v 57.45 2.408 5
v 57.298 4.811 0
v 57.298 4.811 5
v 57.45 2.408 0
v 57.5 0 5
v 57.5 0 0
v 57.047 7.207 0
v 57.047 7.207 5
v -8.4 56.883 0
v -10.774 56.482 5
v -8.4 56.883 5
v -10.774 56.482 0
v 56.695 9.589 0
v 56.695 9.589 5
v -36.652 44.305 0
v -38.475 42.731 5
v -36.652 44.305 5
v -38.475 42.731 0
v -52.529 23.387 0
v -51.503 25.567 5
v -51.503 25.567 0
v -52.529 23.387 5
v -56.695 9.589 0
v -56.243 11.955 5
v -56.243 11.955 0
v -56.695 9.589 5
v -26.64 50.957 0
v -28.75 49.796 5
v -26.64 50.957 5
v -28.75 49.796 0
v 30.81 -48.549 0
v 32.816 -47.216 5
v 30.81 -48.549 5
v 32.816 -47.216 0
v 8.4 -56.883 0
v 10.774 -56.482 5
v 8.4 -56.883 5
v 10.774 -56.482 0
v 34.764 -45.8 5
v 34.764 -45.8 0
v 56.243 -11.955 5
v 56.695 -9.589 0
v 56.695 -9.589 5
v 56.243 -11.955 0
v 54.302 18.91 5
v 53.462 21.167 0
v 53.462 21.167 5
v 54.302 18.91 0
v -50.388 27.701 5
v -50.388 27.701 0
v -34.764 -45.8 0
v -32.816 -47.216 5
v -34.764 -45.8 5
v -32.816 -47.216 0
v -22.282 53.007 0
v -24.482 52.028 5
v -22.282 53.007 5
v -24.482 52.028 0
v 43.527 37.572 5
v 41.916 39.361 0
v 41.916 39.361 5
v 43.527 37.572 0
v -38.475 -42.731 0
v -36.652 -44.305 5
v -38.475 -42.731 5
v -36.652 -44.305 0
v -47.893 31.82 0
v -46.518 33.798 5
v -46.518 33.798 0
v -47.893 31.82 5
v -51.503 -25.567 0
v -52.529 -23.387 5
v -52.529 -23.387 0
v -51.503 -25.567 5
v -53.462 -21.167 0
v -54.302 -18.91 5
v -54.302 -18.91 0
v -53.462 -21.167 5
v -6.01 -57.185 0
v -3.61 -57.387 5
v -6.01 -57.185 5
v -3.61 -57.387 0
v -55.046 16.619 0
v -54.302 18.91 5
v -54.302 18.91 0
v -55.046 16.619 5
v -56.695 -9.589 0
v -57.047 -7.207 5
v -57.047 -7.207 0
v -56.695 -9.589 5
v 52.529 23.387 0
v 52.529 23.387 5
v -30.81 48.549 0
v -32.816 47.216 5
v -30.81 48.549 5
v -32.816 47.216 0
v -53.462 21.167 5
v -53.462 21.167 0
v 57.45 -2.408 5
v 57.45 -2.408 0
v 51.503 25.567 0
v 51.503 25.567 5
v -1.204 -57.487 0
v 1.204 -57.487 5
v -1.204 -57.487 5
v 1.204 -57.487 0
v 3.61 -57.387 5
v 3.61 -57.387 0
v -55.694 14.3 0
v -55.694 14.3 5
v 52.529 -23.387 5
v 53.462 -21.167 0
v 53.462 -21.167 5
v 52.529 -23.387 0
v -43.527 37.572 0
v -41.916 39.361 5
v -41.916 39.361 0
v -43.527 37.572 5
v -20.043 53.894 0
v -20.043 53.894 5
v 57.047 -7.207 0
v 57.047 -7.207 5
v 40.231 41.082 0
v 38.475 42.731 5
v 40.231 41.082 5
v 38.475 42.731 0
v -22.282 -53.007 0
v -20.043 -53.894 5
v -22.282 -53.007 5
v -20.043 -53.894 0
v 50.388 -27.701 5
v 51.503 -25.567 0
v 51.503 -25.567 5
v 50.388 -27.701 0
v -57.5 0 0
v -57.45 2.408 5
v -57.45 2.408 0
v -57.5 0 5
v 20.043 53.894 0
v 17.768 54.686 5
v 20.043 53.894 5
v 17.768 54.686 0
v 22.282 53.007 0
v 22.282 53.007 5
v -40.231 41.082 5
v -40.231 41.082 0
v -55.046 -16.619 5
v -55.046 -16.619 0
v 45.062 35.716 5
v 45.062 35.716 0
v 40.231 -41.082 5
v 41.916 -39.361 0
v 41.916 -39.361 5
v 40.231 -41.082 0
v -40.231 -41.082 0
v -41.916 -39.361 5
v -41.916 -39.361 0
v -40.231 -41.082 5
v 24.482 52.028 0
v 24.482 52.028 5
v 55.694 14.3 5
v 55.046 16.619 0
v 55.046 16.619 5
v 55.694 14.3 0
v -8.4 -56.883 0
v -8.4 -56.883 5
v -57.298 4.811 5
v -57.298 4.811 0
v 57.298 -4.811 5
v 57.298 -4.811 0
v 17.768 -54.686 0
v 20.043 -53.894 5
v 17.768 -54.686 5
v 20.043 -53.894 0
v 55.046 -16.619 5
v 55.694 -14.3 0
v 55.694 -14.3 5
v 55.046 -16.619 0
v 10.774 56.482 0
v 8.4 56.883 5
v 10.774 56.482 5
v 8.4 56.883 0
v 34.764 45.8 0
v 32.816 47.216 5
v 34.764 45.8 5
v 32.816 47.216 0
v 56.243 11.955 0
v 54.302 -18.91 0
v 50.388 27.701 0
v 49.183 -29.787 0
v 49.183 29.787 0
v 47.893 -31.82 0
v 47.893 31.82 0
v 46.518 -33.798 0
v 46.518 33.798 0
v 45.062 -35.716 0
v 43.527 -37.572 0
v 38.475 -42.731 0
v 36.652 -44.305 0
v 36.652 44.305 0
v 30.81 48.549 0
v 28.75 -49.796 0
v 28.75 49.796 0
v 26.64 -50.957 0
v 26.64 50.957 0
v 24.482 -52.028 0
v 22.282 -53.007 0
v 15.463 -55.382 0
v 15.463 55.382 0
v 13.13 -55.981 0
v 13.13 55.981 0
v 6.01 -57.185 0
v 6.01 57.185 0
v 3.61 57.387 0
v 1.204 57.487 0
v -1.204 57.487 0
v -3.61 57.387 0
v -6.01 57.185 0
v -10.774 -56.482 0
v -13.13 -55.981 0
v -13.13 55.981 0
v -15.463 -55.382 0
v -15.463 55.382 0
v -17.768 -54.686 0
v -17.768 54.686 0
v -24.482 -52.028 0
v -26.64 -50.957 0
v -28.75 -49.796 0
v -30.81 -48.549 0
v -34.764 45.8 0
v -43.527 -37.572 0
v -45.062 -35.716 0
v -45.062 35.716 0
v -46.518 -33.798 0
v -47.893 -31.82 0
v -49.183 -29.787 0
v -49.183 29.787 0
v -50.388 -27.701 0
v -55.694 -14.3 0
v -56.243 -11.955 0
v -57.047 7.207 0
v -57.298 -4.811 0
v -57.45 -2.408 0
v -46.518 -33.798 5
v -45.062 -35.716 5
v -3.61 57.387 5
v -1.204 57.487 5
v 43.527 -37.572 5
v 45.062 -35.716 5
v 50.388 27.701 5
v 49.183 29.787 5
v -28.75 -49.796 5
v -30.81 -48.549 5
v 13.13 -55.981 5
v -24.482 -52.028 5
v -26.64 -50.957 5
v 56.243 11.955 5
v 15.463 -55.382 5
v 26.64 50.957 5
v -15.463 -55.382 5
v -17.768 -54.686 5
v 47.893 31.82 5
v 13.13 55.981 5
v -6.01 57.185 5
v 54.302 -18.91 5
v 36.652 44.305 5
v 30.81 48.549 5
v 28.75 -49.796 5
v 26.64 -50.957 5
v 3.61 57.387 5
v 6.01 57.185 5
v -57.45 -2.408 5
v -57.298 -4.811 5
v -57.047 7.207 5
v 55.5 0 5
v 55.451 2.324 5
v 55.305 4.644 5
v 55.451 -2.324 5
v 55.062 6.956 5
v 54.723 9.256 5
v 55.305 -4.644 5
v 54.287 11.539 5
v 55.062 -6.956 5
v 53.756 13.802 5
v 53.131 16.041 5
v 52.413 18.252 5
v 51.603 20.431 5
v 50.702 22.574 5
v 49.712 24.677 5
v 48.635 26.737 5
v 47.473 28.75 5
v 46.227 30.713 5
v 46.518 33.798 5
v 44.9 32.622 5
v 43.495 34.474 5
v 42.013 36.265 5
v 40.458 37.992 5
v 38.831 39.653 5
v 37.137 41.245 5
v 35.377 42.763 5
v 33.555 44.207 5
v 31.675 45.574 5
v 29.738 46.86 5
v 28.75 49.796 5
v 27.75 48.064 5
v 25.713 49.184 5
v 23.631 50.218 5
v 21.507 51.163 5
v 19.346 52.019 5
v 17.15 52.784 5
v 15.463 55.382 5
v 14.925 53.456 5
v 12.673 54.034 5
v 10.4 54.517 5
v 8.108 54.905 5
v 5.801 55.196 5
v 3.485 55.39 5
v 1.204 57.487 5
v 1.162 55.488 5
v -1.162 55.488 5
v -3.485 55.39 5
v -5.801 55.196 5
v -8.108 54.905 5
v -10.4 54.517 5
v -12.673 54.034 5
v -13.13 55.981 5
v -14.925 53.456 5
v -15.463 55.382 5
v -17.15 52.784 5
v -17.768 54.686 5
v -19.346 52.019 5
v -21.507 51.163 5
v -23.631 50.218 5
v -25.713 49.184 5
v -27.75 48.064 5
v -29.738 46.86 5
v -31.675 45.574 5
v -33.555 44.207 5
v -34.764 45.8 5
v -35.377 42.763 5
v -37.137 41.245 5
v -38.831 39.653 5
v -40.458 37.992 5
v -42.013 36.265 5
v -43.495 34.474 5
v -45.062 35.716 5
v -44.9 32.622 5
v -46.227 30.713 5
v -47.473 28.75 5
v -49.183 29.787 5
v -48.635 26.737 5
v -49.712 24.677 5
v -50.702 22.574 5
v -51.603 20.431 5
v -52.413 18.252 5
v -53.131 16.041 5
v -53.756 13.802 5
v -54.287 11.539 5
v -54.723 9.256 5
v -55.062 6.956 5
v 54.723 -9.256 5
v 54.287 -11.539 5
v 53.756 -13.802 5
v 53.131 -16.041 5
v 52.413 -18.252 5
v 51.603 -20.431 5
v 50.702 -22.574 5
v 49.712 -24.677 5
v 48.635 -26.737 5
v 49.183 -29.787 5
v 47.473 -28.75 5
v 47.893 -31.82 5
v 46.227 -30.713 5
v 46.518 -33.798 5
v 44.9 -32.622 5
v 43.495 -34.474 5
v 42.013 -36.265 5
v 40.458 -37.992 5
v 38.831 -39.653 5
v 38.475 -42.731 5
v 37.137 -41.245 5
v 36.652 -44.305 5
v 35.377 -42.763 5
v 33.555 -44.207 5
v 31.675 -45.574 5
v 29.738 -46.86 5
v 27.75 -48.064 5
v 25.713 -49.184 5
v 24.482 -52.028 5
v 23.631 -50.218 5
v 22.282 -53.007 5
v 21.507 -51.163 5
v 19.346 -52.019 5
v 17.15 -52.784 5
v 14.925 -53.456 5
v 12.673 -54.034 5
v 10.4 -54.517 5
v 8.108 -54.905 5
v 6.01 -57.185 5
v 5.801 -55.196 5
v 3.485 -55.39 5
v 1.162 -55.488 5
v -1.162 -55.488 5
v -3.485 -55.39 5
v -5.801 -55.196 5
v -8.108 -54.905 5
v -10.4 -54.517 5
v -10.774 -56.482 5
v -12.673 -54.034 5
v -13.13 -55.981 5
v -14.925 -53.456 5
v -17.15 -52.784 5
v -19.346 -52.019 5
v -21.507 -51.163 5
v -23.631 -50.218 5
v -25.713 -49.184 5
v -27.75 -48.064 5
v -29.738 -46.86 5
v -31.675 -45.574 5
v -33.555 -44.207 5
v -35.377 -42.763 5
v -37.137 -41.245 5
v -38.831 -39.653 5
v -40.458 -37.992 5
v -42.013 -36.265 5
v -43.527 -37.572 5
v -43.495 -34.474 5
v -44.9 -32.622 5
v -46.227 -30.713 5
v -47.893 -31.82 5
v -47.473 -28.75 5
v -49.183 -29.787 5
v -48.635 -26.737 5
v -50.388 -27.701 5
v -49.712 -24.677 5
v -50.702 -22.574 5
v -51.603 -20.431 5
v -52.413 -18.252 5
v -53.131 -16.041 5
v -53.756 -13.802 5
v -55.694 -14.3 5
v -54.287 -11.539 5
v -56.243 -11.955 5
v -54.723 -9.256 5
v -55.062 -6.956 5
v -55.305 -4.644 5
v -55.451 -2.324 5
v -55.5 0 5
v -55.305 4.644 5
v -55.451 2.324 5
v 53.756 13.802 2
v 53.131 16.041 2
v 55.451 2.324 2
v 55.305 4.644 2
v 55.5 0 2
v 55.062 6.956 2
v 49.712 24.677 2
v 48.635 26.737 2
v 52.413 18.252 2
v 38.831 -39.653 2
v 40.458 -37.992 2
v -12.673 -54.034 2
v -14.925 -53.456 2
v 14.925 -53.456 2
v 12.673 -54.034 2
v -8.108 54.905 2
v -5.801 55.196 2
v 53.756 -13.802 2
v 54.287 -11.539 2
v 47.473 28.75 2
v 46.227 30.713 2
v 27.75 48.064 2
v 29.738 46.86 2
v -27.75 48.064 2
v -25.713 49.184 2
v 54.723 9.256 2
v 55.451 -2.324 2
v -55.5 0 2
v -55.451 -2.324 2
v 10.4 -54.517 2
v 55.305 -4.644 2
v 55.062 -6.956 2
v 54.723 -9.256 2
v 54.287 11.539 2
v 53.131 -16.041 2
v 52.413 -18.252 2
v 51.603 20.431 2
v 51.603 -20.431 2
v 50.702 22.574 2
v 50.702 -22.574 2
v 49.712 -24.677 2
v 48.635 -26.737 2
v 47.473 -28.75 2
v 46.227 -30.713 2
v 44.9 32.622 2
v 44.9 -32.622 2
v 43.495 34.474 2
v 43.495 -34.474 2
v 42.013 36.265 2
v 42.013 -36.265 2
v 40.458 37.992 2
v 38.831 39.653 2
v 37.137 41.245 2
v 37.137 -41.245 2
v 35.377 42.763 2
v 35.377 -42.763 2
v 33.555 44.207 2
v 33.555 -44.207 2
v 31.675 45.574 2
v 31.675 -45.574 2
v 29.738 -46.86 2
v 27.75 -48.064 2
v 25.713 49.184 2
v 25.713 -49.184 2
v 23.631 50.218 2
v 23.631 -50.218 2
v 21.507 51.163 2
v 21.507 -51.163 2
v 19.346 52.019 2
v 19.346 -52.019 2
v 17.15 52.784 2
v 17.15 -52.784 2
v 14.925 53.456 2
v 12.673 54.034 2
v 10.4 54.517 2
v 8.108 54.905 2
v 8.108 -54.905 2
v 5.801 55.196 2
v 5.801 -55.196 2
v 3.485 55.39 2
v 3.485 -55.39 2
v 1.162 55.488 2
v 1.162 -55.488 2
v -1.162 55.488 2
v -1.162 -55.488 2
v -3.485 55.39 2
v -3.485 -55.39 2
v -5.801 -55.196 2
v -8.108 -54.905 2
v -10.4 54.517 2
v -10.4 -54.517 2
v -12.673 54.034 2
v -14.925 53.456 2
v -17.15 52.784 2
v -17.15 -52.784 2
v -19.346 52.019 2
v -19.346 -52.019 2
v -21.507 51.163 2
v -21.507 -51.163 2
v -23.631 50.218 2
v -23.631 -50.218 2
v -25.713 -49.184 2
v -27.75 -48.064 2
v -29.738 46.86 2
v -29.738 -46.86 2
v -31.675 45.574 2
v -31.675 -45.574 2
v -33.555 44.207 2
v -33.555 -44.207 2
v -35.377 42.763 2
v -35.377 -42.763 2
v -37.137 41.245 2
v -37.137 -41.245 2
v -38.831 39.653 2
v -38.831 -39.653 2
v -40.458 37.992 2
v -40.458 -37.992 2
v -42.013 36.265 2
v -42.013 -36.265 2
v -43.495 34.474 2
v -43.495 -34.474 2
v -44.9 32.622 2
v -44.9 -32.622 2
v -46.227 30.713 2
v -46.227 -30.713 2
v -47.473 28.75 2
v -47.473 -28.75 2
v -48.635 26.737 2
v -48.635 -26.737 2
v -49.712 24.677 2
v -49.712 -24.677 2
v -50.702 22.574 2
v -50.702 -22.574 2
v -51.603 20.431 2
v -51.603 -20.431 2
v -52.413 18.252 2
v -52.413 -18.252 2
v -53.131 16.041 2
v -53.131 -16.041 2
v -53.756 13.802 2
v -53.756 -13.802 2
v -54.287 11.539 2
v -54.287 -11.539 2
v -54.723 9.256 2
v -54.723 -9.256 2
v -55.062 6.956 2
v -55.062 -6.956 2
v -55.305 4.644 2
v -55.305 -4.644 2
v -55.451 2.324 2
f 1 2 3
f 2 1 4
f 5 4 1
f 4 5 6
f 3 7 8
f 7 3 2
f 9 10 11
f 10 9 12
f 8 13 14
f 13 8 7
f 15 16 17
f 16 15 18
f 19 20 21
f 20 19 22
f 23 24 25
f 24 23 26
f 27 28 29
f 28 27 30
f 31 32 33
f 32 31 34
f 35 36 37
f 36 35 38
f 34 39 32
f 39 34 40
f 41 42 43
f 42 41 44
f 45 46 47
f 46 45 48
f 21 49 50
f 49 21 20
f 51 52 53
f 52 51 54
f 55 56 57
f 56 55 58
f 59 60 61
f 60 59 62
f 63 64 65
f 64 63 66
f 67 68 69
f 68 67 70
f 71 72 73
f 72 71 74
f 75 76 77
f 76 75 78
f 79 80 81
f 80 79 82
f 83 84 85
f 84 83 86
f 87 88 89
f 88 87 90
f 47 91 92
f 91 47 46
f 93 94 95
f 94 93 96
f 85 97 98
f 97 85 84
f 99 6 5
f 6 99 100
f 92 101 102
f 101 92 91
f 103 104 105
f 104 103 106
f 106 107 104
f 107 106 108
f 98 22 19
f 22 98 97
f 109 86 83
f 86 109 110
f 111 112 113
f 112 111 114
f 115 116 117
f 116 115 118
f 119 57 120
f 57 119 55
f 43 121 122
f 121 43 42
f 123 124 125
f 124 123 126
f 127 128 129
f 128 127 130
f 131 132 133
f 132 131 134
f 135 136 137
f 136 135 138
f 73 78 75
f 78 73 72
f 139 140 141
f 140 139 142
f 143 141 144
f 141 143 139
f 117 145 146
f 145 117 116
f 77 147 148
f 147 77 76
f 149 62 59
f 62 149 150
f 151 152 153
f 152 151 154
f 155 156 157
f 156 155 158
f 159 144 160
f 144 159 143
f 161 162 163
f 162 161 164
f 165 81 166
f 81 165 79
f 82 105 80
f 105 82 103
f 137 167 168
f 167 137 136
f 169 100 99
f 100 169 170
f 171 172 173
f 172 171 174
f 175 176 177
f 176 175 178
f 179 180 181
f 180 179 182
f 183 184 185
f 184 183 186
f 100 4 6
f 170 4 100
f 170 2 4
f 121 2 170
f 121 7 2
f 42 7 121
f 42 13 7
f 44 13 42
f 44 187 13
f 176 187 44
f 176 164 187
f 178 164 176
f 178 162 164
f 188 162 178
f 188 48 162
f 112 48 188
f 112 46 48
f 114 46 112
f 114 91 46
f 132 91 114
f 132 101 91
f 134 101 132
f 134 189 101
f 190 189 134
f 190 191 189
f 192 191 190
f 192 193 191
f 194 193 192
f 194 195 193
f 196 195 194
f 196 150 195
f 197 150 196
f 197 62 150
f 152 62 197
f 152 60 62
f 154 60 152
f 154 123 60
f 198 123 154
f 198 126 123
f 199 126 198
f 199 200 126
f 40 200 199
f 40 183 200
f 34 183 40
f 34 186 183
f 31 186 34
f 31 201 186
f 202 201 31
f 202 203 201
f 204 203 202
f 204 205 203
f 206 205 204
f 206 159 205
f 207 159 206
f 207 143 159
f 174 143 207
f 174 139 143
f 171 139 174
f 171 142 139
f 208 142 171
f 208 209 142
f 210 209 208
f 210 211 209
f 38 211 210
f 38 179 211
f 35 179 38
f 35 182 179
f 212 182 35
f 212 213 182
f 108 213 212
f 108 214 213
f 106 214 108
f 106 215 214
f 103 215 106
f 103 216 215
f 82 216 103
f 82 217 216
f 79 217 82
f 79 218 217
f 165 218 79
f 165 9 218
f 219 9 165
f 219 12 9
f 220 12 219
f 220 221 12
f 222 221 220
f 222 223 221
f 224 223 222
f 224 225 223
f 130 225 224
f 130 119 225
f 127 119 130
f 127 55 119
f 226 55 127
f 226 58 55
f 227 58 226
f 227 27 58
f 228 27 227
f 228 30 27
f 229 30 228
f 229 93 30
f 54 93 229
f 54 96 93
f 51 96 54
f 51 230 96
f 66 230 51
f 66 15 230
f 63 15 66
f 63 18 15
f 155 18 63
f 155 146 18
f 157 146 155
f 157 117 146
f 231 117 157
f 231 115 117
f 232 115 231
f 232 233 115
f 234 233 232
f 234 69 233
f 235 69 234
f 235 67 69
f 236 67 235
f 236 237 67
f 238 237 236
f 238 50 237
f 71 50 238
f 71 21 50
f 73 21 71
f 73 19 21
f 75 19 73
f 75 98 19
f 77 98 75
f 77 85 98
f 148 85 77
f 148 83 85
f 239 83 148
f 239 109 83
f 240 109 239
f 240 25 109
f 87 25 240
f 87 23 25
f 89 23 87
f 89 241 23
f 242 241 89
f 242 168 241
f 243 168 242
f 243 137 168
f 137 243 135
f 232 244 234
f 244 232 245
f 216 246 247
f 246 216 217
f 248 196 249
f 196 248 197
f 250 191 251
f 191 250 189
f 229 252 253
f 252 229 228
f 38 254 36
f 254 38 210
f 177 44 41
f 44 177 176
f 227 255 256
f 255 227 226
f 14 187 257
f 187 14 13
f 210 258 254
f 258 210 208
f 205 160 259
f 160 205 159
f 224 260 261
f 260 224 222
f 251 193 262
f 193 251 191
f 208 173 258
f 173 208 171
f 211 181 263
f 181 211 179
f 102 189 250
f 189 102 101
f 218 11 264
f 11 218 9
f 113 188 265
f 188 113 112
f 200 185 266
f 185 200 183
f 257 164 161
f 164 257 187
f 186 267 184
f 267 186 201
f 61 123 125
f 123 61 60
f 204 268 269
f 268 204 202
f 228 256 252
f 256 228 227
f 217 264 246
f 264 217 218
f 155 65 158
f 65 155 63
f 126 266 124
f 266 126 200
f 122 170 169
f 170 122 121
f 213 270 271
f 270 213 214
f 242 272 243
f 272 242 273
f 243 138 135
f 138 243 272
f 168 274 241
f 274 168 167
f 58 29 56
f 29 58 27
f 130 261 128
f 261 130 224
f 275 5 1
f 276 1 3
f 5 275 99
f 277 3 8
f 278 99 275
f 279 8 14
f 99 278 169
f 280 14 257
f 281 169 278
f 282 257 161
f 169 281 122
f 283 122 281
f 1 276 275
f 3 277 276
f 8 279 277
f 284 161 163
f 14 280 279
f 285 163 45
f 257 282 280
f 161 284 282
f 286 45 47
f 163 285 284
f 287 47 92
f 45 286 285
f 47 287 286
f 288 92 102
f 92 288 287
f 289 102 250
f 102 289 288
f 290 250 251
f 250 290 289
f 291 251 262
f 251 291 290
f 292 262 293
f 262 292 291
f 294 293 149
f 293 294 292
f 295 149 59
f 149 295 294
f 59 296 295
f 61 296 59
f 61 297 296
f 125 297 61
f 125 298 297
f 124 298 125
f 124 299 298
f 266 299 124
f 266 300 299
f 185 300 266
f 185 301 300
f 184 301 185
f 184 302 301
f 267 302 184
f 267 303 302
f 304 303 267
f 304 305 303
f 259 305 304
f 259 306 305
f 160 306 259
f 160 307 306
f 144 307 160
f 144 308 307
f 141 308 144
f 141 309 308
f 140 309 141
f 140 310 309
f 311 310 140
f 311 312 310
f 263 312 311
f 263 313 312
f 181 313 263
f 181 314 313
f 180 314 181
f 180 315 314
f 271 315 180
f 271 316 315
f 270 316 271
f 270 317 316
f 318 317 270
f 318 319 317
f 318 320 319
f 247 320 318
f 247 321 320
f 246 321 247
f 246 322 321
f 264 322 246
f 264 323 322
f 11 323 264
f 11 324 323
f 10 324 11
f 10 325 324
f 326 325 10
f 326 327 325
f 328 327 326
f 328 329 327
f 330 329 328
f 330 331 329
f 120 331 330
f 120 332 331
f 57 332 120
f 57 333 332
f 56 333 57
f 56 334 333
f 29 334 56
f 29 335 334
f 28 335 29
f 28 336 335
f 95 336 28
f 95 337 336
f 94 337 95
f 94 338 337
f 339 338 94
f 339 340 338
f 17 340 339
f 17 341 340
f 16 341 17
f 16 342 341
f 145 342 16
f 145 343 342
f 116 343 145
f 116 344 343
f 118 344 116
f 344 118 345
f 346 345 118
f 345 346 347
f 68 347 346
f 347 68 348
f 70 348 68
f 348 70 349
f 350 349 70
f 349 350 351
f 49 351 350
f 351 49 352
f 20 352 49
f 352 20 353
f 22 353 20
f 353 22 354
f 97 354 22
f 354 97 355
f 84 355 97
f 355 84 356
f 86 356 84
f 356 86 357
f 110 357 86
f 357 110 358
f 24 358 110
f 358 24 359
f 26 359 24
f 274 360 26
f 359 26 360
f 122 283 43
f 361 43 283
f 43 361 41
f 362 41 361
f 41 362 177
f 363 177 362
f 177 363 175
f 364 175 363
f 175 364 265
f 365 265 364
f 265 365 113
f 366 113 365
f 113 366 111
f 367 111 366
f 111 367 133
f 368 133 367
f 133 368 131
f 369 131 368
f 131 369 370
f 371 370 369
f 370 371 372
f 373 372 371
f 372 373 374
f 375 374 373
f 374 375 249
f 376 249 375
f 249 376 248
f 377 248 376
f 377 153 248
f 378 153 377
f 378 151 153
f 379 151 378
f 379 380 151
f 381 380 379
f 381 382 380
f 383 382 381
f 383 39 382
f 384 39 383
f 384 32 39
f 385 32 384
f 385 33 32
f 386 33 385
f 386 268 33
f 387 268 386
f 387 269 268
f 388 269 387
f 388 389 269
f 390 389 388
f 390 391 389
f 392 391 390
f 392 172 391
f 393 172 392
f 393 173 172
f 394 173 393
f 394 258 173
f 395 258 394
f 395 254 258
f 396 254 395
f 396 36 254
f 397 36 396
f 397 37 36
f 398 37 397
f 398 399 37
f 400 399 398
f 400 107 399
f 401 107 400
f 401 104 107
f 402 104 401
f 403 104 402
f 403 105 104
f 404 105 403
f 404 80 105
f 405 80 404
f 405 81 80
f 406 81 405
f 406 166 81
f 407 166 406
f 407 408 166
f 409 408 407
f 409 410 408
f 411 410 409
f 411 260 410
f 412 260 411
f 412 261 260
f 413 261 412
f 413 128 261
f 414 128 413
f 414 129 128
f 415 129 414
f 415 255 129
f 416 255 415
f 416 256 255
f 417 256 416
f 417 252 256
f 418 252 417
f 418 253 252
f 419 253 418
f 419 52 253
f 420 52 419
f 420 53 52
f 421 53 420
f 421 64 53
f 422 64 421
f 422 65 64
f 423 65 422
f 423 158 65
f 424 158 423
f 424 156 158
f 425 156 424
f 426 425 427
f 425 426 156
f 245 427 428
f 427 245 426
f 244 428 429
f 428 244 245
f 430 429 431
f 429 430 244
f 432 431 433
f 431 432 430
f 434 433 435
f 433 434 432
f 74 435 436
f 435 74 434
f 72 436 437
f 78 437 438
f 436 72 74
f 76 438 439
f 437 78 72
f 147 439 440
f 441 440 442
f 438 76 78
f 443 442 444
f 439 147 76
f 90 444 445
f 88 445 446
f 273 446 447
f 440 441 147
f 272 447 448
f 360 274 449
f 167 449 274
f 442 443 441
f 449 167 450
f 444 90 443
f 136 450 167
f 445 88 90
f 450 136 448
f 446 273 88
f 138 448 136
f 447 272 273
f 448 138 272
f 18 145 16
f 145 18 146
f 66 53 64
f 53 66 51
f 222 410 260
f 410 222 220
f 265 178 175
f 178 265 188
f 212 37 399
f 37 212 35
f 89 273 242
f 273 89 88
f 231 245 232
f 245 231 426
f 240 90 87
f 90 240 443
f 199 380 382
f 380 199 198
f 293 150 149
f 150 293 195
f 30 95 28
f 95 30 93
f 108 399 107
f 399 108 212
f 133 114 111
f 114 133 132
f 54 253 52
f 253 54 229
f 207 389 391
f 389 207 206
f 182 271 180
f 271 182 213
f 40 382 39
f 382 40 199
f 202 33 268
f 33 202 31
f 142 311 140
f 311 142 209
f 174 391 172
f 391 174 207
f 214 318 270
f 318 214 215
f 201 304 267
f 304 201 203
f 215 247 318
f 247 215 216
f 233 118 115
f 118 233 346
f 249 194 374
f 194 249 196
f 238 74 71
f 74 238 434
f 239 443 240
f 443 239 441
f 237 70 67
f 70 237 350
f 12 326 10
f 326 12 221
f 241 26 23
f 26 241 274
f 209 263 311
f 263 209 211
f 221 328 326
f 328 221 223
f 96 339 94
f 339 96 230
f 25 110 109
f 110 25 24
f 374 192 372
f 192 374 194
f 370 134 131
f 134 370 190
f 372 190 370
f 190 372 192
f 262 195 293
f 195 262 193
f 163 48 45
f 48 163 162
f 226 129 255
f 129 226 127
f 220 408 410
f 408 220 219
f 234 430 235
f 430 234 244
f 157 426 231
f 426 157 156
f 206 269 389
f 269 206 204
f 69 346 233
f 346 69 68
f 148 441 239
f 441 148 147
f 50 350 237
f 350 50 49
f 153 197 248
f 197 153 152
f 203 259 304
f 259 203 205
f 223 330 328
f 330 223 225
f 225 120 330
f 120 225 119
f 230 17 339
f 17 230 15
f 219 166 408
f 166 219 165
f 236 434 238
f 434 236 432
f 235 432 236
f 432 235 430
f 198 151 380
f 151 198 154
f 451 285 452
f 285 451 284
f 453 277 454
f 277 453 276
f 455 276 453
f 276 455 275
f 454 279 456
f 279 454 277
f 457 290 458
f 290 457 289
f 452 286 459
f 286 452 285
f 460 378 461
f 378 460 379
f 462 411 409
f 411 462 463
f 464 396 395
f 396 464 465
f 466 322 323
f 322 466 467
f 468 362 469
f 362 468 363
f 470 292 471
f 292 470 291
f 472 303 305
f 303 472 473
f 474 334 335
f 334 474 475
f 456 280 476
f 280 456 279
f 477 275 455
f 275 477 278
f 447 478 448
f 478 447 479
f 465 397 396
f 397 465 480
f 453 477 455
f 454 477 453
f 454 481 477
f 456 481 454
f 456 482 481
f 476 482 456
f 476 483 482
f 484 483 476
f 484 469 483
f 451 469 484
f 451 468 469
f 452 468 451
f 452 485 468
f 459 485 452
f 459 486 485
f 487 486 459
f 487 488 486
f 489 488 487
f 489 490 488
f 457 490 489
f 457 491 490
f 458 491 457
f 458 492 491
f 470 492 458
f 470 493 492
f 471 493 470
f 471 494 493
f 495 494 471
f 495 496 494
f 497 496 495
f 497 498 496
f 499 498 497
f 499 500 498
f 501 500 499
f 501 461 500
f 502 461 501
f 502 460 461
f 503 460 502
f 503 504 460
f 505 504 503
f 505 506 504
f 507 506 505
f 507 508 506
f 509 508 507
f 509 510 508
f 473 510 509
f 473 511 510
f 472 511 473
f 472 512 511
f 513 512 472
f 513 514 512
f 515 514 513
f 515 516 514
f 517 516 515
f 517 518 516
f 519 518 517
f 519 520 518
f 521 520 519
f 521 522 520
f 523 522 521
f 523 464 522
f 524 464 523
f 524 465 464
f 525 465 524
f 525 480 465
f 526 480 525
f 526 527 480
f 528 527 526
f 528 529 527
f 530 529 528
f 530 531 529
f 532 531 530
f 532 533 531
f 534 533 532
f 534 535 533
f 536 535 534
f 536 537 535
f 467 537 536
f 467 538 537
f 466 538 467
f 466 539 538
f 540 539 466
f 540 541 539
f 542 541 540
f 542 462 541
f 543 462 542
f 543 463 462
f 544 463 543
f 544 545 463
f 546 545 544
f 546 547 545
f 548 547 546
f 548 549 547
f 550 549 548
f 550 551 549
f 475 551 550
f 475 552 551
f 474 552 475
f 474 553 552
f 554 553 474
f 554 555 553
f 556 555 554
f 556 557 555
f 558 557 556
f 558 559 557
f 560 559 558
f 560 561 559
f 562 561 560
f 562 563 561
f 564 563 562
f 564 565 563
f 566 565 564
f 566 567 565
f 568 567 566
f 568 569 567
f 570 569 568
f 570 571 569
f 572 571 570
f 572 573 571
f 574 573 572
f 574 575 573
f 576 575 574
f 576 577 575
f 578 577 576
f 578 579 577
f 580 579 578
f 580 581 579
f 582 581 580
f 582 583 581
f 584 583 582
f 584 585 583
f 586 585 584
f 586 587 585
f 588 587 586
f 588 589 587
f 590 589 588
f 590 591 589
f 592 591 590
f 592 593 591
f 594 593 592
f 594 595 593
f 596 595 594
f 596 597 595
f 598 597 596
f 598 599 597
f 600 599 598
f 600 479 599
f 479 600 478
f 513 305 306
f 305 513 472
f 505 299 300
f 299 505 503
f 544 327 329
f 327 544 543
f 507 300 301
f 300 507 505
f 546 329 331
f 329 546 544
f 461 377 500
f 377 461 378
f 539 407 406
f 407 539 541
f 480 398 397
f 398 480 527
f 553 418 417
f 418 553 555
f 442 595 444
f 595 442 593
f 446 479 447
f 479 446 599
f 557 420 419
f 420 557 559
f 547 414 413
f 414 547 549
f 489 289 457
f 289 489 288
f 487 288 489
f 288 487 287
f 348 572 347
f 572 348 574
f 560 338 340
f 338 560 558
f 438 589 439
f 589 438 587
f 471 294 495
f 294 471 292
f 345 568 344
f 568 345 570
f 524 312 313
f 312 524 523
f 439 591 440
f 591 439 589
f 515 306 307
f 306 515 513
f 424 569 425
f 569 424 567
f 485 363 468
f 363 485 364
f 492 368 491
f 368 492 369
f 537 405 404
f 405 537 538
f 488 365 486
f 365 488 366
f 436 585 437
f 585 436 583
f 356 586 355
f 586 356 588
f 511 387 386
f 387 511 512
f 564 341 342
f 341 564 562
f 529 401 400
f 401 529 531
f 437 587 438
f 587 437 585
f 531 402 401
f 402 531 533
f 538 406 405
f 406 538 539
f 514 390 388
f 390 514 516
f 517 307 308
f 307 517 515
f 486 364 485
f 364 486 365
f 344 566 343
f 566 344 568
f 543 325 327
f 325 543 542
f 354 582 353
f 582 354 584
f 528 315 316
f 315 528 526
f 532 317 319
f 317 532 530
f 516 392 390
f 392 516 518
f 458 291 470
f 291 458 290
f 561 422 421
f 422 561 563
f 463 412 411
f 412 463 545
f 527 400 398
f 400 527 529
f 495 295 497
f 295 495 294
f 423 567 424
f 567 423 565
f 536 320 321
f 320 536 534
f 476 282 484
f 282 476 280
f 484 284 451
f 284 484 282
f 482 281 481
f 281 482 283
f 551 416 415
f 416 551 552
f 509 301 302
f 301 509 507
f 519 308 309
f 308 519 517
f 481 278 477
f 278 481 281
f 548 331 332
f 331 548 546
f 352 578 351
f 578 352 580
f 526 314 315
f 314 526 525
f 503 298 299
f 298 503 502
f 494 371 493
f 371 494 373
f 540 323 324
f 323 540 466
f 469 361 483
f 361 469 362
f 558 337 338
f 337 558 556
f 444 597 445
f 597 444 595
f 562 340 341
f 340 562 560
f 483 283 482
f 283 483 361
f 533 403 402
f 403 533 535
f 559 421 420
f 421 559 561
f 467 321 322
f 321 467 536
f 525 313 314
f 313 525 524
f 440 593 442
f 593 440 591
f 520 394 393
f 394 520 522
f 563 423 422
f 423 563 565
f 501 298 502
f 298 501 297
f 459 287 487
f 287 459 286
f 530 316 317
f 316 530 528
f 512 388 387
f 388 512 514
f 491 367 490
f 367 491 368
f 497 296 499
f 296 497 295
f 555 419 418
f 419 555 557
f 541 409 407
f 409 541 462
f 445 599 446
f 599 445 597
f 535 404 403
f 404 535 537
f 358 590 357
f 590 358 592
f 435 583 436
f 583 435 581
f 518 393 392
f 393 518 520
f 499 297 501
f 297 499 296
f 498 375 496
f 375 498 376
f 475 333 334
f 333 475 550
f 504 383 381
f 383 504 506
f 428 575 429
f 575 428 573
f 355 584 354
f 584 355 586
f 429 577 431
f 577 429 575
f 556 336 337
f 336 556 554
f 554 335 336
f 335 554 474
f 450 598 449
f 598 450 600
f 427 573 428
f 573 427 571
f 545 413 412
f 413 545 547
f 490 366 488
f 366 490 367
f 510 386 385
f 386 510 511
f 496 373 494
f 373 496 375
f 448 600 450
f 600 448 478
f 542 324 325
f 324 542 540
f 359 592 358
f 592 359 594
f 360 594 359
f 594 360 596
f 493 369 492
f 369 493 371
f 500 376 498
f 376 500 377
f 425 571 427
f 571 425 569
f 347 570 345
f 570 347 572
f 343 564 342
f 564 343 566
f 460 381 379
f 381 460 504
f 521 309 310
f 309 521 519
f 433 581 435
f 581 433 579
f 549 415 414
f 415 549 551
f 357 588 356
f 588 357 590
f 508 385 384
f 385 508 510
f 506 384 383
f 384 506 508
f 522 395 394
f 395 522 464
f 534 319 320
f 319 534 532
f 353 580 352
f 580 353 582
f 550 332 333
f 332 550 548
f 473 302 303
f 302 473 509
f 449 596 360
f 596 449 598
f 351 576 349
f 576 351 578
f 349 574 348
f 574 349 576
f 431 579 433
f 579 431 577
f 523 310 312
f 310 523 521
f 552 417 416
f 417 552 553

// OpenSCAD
$fn = 150;

difference() {
	cylinder(d = 115.0, h = 5.0);
	translate(v = [0, 0, 2]) {
		cylinder(d = 111.0, h = 5.0);
	}
}
